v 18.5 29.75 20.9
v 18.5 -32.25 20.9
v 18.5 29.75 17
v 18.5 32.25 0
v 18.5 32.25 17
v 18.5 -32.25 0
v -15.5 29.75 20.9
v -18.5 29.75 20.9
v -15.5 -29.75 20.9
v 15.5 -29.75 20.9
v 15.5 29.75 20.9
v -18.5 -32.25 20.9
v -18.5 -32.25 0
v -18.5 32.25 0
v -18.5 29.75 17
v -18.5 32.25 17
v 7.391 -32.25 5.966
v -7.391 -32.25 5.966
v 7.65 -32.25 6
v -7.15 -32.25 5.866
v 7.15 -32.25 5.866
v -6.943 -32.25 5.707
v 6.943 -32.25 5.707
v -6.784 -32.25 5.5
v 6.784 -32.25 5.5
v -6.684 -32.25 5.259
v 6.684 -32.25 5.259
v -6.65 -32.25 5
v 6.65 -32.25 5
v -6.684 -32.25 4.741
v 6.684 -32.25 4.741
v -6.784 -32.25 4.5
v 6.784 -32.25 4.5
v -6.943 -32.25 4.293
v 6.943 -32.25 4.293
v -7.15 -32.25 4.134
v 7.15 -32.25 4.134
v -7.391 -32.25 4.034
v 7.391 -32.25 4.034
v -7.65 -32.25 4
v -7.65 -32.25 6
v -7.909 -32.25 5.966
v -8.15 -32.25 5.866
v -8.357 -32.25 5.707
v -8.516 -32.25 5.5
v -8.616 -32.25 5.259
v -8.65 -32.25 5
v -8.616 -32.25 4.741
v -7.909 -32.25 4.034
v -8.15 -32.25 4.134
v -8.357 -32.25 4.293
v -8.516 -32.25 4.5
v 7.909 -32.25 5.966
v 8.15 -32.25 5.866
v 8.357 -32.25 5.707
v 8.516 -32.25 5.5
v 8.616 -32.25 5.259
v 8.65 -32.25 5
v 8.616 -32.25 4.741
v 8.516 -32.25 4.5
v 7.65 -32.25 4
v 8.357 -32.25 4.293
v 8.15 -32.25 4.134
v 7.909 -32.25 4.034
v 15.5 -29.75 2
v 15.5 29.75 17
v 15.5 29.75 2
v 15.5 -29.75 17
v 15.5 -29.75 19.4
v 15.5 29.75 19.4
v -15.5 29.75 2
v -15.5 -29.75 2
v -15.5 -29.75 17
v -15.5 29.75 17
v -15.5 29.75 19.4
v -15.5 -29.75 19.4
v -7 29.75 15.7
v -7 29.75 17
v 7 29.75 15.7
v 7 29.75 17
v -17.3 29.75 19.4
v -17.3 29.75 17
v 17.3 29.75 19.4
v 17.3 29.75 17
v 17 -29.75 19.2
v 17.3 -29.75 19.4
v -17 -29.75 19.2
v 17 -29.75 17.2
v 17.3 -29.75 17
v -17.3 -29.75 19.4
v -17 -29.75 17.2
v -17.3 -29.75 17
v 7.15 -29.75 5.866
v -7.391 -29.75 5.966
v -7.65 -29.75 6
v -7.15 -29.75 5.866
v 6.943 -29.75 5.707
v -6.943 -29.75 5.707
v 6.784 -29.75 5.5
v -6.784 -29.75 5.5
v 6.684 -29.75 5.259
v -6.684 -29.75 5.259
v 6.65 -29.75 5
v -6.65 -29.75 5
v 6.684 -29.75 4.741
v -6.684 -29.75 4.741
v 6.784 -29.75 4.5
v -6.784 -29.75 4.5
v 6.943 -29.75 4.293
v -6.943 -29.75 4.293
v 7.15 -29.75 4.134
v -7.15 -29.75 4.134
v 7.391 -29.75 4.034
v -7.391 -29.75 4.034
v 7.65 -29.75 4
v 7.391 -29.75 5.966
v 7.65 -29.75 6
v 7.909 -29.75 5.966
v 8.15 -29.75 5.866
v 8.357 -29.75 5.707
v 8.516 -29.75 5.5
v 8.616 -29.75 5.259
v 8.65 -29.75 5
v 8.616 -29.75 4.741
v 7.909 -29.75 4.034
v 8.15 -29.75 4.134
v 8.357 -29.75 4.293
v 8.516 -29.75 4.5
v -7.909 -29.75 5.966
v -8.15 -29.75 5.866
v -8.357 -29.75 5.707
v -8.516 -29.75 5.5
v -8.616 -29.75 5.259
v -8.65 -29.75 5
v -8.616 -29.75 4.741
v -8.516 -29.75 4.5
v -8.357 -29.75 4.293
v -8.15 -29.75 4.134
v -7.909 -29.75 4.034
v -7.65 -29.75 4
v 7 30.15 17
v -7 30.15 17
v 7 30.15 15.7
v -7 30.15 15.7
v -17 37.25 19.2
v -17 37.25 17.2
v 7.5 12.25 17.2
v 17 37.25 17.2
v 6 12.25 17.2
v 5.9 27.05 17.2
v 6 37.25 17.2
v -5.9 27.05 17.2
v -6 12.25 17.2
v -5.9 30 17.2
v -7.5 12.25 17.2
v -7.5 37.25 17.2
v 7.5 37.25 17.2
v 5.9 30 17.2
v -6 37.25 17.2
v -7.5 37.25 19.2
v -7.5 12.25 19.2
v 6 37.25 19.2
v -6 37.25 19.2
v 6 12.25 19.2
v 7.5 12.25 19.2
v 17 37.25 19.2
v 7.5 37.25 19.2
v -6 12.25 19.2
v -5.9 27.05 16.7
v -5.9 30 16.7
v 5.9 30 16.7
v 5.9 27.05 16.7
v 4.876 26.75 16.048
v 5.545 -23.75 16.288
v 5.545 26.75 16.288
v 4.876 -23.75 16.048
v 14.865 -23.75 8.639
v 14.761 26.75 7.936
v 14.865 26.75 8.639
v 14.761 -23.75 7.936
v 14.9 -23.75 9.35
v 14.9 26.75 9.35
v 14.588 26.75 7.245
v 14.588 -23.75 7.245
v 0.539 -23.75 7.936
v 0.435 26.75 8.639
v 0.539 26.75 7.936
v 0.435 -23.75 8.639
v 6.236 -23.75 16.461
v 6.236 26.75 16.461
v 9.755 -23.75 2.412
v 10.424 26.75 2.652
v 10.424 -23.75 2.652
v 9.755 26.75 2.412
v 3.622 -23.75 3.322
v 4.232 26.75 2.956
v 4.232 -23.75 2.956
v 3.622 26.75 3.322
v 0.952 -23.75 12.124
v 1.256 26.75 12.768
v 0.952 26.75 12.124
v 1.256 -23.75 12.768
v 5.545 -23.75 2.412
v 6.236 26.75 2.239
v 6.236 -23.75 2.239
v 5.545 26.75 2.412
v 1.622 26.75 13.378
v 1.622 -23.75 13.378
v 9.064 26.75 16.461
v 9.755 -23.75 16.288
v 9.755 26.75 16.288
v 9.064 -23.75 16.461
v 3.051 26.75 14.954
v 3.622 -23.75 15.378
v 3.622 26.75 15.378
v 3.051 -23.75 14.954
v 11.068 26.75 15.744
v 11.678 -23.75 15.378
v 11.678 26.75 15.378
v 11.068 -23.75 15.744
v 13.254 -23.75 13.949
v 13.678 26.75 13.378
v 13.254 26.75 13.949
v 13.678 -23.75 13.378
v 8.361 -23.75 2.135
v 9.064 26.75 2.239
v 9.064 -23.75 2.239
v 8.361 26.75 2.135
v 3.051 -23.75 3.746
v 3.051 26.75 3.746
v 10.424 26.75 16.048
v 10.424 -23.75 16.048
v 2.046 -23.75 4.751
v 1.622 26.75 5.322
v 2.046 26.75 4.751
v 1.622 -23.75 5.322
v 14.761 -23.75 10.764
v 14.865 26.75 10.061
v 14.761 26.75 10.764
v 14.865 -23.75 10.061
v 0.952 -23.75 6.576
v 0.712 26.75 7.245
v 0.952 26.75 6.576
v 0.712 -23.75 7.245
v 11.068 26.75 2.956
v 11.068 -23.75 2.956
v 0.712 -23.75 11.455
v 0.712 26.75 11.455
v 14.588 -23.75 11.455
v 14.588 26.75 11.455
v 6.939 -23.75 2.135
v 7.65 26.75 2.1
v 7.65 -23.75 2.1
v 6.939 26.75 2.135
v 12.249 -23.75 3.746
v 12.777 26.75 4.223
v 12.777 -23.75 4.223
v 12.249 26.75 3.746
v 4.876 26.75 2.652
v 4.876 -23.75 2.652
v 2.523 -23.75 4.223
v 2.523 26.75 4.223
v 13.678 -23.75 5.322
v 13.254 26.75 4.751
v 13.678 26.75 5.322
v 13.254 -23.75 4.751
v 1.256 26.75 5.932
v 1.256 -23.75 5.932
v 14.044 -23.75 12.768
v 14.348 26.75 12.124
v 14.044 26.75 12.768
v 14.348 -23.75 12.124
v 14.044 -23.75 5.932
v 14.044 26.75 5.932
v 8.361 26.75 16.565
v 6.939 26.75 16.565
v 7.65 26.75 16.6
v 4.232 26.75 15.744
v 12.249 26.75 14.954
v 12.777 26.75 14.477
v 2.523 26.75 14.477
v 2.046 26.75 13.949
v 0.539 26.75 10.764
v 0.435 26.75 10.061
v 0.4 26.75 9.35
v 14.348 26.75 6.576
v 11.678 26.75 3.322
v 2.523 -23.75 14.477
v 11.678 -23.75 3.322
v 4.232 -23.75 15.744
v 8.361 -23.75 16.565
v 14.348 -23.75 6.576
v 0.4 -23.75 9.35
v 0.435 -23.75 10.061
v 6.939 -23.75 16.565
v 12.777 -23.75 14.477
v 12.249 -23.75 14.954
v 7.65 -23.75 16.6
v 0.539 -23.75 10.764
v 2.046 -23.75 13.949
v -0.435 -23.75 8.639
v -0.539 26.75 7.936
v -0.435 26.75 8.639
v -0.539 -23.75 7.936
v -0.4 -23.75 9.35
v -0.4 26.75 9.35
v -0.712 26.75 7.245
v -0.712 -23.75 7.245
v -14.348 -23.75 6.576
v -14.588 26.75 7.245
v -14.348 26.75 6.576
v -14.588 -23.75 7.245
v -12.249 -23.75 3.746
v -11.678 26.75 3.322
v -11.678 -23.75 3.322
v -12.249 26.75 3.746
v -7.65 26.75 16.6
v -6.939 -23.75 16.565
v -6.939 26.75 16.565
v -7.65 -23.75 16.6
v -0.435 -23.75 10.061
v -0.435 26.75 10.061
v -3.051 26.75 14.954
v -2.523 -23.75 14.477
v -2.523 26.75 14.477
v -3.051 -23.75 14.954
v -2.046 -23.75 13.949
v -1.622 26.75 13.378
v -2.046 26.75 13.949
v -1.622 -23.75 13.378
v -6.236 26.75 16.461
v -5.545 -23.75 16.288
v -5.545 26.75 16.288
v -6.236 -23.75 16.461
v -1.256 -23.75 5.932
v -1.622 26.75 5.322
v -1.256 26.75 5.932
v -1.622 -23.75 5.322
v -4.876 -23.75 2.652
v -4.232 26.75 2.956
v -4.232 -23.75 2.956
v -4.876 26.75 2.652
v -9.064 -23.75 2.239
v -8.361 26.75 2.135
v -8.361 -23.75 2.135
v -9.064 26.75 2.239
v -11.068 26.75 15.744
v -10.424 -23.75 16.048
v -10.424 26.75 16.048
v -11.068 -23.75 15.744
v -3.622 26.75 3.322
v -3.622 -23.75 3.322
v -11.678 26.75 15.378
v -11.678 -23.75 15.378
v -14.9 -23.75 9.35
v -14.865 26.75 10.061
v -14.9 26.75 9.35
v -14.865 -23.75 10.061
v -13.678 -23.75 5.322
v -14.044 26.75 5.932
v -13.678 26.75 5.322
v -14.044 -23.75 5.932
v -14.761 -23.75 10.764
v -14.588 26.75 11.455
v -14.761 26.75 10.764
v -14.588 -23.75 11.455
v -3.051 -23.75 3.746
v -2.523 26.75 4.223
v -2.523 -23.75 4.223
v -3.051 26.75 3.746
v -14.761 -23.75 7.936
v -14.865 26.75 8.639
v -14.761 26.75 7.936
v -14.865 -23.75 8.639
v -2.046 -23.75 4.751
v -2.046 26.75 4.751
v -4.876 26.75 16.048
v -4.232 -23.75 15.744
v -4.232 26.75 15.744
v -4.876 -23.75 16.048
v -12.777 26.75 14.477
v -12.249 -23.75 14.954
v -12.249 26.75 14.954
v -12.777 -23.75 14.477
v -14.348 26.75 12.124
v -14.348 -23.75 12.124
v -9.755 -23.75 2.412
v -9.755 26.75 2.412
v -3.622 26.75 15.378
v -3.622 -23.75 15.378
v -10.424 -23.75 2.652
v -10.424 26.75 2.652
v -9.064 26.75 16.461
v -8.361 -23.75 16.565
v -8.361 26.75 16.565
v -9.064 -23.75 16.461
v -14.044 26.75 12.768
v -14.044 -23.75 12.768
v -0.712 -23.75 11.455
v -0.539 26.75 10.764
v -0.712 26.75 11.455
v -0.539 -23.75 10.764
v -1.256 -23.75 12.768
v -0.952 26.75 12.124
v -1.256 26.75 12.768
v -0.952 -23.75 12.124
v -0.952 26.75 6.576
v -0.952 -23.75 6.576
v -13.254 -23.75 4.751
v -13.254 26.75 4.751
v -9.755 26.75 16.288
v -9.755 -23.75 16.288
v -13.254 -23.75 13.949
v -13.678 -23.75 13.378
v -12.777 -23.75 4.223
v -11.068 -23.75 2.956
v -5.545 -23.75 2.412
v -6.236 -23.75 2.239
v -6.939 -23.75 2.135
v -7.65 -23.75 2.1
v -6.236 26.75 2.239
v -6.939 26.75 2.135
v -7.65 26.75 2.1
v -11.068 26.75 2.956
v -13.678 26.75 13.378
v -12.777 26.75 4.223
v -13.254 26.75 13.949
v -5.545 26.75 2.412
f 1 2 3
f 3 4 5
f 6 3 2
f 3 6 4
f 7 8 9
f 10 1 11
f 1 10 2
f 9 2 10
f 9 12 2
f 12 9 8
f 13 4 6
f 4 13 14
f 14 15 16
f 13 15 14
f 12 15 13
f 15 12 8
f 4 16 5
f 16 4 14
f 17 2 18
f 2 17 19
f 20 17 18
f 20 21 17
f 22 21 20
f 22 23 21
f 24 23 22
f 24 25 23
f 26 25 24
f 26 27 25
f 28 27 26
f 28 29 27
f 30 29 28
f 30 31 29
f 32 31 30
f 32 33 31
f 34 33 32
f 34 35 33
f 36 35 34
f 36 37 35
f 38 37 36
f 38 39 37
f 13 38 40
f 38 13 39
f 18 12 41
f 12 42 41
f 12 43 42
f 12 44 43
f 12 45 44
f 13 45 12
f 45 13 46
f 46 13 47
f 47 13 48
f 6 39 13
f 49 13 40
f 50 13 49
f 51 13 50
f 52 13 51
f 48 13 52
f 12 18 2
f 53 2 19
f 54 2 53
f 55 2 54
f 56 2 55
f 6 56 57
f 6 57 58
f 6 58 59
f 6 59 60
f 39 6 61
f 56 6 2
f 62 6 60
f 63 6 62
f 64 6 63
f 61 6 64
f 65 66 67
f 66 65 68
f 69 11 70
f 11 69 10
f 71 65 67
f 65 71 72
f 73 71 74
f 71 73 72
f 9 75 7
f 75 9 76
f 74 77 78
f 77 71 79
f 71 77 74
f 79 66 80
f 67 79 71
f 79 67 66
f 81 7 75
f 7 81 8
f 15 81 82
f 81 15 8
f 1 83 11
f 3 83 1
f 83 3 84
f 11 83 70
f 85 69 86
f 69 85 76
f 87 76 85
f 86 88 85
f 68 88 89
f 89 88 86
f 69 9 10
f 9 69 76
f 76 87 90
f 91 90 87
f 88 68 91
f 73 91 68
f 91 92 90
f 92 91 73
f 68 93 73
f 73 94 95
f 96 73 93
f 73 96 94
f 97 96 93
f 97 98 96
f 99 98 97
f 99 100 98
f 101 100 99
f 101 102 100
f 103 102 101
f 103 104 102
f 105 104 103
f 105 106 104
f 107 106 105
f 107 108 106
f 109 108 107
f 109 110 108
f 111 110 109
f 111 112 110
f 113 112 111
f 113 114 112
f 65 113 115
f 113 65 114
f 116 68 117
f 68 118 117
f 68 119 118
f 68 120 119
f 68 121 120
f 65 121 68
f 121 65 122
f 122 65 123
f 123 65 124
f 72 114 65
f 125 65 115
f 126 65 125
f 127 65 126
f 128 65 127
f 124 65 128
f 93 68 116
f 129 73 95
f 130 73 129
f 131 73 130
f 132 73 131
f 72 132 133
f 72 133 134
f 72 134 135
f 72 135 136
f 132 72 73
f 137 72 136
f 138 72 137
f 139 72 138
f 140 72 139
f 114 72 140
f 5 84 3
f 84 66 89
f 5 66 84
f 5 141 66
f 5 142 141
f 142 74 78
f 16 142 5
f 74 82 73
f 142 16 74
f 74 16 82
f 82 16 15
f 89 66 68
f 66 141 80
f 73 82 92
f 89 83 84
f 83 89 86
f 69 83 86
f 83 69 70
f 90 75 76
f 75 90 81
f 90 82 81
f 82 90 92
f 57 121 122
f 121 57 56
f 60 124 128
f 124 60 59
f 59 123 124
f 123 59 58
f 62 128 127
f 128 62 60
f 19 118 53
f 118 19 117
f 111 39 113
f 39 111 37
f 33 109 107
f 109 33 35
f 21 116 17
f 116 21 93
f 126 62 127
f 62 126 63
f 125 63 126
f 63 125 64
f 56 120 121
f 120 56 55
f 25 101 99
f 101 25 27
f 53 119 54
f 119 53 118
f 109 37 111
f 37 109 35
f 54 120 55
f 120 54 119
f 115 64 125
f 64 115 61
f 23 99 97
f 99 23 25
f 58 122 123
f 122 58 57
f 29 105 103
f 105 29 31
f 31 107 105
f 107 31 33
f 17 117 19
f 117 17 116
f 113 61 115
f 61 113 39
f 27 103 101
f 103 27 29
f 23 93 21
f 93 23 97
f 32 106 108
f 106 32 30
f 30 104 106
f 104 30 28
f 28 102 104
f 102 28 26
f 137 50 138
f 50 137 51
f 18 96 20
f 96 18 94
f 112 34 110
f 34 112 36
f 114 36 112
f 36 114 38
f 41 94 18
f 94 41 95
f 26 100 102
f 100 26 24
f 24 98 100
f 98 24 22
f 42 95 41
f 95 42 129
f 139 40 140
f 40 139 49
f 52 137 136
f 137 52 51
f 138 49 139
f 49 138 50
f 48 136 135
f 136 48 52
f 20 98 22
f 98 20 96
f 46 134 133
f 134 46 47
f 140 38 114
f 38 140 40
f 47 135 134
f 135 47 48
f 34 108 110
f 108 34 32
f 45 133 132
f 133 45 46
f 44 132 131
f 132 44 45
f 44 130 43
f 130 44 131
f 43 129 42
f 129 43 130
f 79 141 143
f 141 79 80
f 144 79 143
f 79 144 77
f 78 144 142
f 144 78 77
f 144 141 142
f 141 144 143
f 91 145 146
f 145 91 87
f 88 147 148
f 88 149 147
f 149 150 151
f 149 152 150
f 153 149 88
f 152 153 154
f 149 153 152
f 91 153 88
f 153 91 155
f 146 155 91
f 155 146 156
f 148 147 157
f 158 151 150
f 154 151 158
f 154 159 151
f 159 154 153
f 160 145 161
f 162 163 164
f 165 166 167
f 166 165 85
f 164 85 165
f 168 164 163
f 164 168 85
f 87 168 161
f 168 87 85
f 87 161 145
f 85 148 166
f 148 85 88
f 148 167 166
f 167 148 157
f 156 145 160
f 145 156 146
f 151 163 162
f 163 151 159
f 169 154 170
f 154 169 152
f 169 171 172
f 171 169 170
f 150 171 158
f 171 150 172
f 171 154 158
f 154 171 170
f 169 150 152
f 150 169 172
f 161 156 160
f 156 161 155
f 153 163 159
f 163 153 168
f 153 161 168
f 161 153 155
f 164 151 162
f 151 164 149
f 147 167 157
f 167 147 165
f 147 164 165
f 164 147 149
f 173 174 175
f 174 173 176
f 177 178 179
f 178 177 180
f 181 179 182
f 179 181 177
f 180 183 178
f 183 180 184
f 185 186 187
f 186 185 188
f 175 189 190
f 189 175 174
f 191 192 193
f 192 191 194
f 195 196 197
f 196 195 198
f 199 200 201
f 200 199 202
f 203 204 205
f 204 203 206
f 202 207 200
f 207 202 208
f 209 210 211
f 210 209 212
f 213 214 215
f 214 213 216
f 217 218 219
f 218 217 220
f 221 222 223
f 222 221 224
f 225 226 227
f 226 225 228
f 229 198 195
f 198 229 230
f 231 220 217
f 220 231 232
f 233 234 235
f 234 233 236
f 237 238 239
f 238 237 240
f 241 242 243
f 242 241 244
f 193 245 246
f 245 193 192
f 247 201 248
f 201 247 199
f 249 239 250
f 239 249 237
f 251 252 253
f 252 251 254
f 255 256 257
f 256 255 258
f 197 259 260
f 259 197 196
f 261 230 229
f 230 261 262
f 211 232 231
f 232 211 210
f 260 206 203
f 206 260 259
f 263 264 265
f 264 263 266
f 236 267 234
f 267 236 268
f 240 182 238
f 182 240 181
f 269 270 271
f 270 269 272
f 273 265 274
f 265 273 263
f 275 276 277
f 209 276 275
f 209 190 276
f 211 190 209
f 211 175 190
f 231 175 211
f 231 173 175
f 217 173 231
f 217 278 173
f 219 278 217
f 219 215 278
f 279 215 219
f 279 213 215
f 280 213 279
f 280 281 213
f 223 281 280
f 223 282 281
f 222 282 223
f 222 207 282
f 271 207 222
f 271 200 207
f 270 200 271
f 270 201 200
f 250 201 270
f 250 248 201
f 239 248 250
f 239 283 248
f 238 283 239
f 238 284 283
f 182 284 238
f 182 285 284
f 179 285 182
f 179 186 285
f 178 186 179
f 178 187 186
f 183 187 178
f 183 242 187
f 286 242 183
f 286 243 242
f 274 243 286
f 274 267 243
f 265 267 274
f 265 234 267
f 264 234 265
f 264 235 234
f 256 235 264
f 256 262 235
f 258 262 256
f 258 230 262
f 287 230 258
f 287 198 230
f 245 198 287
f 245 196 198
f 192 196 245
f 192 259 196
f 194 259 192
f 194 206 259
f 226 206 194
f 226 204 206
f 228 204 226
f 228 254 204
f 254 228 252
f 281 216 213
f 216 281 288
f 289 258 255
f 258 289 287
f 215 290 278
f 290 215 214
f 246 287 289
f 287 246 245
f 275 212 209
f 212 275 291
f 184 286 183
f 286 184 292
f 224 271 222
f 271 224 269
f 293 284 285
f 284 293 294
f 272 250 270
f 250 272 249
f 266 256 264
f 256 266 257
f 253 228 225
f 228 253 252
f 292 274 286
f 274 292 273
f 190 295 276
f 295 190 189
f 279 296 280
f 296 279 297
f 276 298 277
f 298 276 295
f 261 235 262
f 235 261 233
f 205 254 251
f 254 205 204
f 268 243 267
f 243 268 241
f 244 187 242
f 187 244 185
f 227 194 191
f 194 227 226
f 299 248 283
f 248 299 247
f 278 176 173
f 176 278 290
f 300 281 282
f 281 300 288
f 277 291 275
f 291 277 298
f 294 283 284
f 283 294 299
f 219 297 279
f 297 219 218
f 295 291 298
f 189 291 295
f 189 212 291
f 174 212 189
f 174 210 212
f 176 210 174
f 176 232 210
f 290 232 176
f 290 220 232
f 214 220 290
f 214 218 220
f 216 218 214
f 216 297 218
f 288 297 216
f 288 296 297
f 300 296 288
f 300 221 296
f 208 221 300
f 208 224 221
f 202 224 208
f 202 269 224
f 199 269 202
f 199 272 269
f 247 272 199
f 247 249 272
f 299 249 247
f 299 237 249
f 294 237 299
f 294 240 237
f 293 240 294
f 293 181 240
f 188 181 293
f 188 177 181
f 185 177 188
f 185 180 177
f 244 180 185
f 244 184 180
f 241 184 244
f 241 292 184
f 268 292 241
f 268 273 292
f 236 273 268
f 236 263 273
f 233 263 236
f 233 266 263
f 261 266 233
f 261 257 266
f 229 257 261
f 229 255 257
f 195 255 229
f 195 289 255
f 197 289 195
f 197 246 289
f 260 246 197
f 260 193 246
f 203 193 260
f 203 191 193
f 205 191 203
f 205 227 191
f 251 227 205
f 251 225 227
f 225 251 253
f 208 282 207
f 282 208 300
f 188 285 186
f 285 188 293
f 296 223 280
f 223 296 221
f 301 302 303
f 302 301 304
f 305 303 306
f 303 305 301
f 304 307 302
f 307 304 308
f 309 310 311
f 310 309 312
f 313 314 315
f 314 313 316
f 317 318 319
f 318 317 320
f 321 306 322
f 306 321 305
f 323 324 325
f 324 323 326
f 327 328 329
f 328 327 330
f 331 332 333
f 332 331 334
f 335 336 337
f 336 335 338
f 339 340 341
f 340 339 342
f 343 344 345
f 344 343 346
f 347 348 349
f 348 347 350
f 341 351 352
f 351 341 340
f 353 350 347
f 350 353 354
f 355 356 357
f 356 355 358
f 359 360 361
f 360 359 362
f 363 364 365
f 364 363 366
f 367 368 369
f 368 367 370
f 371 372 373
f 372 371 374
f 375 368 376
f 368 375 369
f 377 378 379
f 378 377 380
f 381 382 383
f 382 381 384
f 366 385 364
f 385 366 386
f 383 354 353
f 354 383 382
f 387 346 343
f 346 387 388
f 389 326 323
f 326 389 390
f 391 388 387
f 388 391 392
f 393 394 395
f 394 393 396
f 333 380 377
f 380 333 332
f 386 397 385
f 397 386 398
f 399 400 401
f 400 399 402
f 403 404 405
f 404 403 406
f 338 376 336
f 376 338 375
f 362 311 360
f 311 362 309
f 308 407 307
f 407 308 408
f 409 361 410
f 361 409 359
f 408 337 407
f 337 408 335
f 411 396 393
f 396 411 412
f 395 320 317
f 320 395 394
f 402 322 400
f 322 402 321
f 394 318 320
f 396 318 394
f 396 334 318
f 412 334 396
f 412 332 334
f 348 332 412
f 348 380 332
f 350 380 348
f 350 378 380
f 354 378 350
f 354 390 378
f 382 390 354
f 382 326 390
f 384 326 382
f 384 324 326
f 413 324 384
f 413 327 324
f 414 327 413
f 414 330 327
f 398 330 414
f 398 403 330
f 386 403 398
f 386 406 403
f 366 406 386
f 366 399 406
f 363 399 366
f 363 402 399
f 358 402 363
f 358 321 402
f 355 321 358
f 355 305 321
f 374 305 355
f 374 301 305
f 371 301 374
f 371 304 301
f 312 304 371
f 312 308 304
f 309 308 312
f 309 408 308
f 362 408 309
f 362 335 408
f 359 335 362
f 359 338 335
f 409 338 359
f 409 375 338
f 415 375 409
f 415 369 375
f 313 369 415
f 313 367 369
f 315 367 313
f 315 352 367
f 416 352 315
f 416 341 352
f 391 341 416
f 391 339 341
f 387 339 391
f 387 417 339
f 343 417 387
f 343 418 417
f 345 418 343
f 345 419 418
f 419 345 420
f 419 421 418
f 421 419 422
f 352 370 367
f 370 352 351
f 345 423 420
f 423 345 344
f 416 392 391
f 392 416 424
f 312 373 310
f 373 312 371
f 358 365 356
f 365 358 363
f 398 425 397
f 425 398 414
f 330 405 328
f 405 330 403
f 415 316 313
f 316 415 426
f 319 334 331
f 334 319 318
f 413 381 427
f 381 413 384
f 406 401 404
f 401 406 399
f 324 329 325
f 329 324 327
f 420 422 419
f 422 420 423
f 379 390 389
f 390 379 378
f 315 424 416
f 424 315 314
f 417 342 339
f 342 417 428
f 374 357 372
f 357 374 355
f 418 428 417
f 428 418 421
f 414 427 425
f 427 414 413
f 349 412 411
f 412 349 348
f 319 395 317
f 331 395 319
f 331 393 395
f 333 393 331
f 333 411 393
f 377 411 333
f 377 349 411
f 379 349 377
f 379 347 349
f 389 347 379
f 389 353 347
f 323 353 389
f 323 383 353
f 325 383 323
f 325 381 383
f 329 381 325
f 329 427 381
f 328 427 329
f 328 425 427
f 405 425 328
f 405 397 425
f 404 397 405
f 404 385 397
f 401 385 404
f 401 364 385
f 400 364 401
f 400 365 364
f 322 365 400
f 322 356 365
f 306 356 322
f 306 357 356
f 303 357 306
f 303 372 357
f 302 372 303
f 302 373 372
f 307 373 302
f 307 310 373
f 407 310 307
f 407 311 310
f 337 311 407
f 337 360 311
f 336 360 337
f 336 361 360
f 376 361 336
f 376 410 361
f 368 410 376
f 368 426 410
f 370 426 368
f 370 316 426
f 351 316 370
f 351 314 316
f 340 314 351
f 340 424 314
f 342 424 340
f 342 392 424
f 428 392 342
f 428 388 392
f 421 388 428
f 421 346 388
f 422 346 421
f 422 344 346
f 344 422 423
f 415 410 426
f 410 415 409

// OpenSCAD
/* Holder for two AA batteries with sliding cover.
   PLA, 0.4mm nozzle, no supports. Units mm.
   Print orientation: +Z up, parts rest on min z.
*/

// ---------- parameters ----------
battery_d = 14.5;
battery_l = 50.5;
side_gap = 0.6;      // battery side to wall
mid_gap = 0.8;       // between batteries
Wi = 2*battery_d + mid_gap + 2*side_gap; // 31.0 interior width
Li = battery_l + 3 + 6;                  // 59.5 interior length
floor_t = 2.0;
side_t = 3.0;
end_t = 2.5;
Wext = Wi + 2*side_t;   // 37
Lext = Li + 2*end_t;    // 64.5
wall_top = 20.9;
low_top = 17.0;
groove_bottom = 17.0;
groove_h = 2.4;
groove_top = groove_bottom + groove_h; // 19.4
groove_depth = 1.8;
engage = 1.5;
Wc = Wi + 2*engage;     // 34 cover width
Lc0 = Lext/2 + Li/2;      // 62 main length (leading edge butts on spring wall)
lip_len = 5.0;
Lc = Lc0 + lip_len;     // 67 total cover length
y0b = -Lext/2;          // -32.25 base min y
y1b = Lext/2;           // 32.25 base max y
y0c = -Li/2;            // -29.75 cover min y (stops at spring wall inner face)
y1c = Lext/2 + lip_len; // 37.25 cover max y
tc = 2.0;
finger_w = 12;
slot_w = 1.5;
finger_y0 = 12.25;
tooth_w = 11.8;
tooth_yl = 2.95;
tooth_y0 = 27.05;
tooth_y1 = tooth_y0 + tooth_yl; // 30.0: snaps into wall notch in closed pose
tooth_h = 0.5;
notch_hw = 7;
notch_y0 = 29.25;
notch_y1 = 30.15;
notch_bot = 15.7;
bx = battery_d/2 + mid_gap/2; // 7.65 battery center x
battery_y0 = -Li/2 + 6;       // -23.75 spring side
battery_y1 = battery_y0 + battery_l; // 26.75
battery_yc = (battery_y0 + battery_y1)/2; // 1.5
battery_zc = floor_t + battery_d/2 + 0.1; // 9.35 slight lift
wire_z = 5;
wire_r = 1.0;

part = "assembly"; // [base, cover, assembly]
cadverify_only = "";
module instance(name, part, unit = 1) {
    echo(cadverify_instance = [name, part, unit]);
    if (cadverify_only == "" || cadverify_only == name) children();
}

module battery() {
    rotate([-90,0,0])
        cylinder(d=battery_d, h=battery_l, center=true, $fn=64);
}

module base() {
    difference() {
        // outer solid
        translate([-Wext/2, y0b, 0])
            cube([Wext, Lext, wall_top]);
        // interior cavity open at top
        translate([-Wi/2, -Li/2, floor_t])
            cube([Wi, Li, wall_top - floor_t + 1]);
        // low end wall cut (+Y end)
        translate([-Wext/2, Li/2, low_top])
            cube([Wext, Lext/2 - Li/2 + 0.5, wall_top - low_top + 1]);
        // left groove
        translate([Wi/2, -Li/2, groove_bottom])
            cube([groove_depth, Li/2 + Lext/2 + 0.5, groove_h]);
        // right groove
        translate([-Wi/2 - groove_depth, -Li/2, groove_bottom])
            cube([groove_depth, Li/2 + Lext/2 + 0.5, groove_h]);
        // wire holes through spring (-Y) wall
        translate([bx, y0b - 1, wire_z])
            rotate([-90,0,0])
                cylinder(r=wire_r, h=end_t + 2, $fn=24);
        translate([-bx, y0b - 1, wire_z])
            rotate([-90,0,0])
                cylinder(r=wire_r, h=end_t + 2, $fn=24);
        // latch notch in low wall top
        translate([-notch_hw, notch_y0, notch_bot])
            cube([2*notch_hw, notch_y1 - notch_y0, low_top - notch_bot + 0.02]);
    }
}

module cover() {
    // print orientation: plate 0..tc, tooth on top tc..tc+tooth_h
    difference() {
        union() {
            translate([-Wc/2, y0c, 0])
                cube([Wc, Lc, tc]);
            // latch tooth on top (becomes bottom after flip)
            translate([-tooth_w/2, tooth_y0, tc])
                cube([tooth_w, tooth_yl, tooth_h]);
        }
        // finger slots, open at +Y lip end
        translate([finger_w/2, finger_y0, -0.5])
            cube([slot_w, y1c - finger_y0 + 0.5, tc + 1.5]);
        translate([-finger_w/2 - slot_w, finger_y0, -0.5])
            cube([slot_w, y1c - finger_y0 + 0.5, tc + 1.5]);
    }
}

module assembly() {
    instance("base", "base", 1) base();
    instance("battery_left", "external", 1)
        translate([bx, battery_yc, battery_zc]) battery();
    instance("battery_right", "external", 1)
        translate([-bx, battery_yc, battery_zc]) battery();
    // cover printed upside-down: rotate 180 about Y then lift
    instance("cover", "cover", 1)
        translate([0, 0, 19.2]) rotate([0,180,0]) cover();
}

// ---------- specs ----------
if (part == "base") {
    echo(cadverify_spec = [
        ["bounds", [[-Wext/2, y0b, 0], [Wext/2, y1b, wall_top]]],
        ["bodies", 1],
        ["through_holes", 2],
        ["support_faces", [["bottom", "-z", 2000]]],
        ["overhangs_allowed", [
            ["groove ceilings bridge 3.6mm", [[Wi/2 - 0.6, -Li/2 - 0.5, groove_bottom - 0.5], [Wi/2 + groove_depth + 0.5, y1b + 0.2, groove_top + 0.6]]],
            ["groove ceilings bridge 3.6mm", [[-Wi/2 - groove_depth - 0.5, -Li/2 - 0.5, groove_bottom - 0.5], [-Wi/2 + 0.6, y1b + 0.2, groove_top + 0.6]]],
            ["wire holes 2mm dia bridges", [[-10, y0b - 0.5, wire_z - 1.5], [10, -Li/2 + 0.5, wire_z + 1.5]]]
        ]],
        ["copies", 1],
        ["details", [
            ["cavity", "void", [[-Wi/2, -Li/2, floor_t], [Wi/2, Li/2, 17]], 0.9],
            ["spring_room", "void", [[-Wi/2, -Li/2, floor_t], [Wi/2, -Li/2 + 6, 16.6]], 0.9],
            ["pos_room", "void", [[-Wi/2, Li/2 - 3, floor_t], [Wi/2, Li/2, 16.6]], 0.9],
            ["groove_left", "void", [[Wi/2, -Li/2, groove_bottom], [Wi/2 + groove_depth, y1b, groove_top]], 0.85],
            ["groove_right", "void", [[-Wi/2 - groove_depth, -Li/2, groove_bottom], [-Wi/2, y1b, groove_top]], 0.85],
            ["notch", "void", [[-notch_hw, notch_y0, notch_bot], [notch_hw, notch_y1, low_top + 0.02]], 0.85],
            ["wire1", "hole", [bx, y0b - 1, wire_z], [0, 1, 0], [[0, 2], [2, 2]]],
            ["wire2", "hole", [-bx, y0b - 1, wire_z], [0, 1, 0], [[0, 2], [2, 2]]],
            ["floor", "thickness", [0, 0, -1], [0, 0, 1], 2.0],
            ["side_wall", "thickness", [Wext/2 + 1, 0, 18.2], [-1, 0, 0], 1.2],
            ["end_wall", "thickness", [0, y1b + 1, 10], [0, -1, 0], 2.5]
        ]]
    ]);
    base();
} else if (part == "cover") {
    echo(cadverify_spec = [
        ["bounds", [[-Wc/2, y0c, 0], [Wc/2, y1c, tc + tooth_h]]],
        ["bodies", 1],
        ["through_holes", 0],
        ["support_faces", [["bottom", "-z", 1500]]],
        ["overhangs_allowed", []],
        ["copies", 1],
        ["details", [
            ["plate", "thickness", [0, -10, -1], [0, 0, 1], 2.0],
            ["finger", "material", [[-finger_w/2, finger_y0, 0], [finger_w/2, y1c, tc]], 0.85],
            ["slot_left", "void", [[finger_w/2, finger_y0, -0.5], [finger_w/2 + slot_w, y1c + 0.01, tc + 0.5]], 0.85],
            ["slot_right", "void", [[-finger_w/2 - slot_w, finger_y0, -0.5], [-finger_w/2, y1c + 0.01, tc + 0.5]], 0.85],
            ["tooth", "material", [[-tooth_w/2, tooth_y0, tc], [tooth_w/2, tooth_y1, tc + tooth_h]], 0.85],
            ["lip", "material", [[-Wc/2, y1b, 0], [Wc/2, y1c, tc]], 0.9]
        ]]
    ]);
    cover();
} else if (part == "assembly") {
    echo(cadverify_spec = [
        ["bounds", [[-Wext/2, y0b, 0], [Wext/2, y1c, wall_top]]],
        ["support_faces", [["bottom", "-z", 2000]]],
        ["allowed_interferences", []],
        ["motions", [
            ["slide_cover", ["cover"], "slide", [0, 1, 0], [0, 60], ["flex", [["cover", "base", 1.0, "latch tooth rides over end wall"]]]]
        ]],
        ["assembly_order", [
            [["base"], [0, 0, 0]],
            [["battery_left"], [0, 0, -1]],
            [["battery_right"], [0, 0, -1]],
            [["cover"], [0, -1, 0]]
        ]]
    ]);
    assembly();
}
